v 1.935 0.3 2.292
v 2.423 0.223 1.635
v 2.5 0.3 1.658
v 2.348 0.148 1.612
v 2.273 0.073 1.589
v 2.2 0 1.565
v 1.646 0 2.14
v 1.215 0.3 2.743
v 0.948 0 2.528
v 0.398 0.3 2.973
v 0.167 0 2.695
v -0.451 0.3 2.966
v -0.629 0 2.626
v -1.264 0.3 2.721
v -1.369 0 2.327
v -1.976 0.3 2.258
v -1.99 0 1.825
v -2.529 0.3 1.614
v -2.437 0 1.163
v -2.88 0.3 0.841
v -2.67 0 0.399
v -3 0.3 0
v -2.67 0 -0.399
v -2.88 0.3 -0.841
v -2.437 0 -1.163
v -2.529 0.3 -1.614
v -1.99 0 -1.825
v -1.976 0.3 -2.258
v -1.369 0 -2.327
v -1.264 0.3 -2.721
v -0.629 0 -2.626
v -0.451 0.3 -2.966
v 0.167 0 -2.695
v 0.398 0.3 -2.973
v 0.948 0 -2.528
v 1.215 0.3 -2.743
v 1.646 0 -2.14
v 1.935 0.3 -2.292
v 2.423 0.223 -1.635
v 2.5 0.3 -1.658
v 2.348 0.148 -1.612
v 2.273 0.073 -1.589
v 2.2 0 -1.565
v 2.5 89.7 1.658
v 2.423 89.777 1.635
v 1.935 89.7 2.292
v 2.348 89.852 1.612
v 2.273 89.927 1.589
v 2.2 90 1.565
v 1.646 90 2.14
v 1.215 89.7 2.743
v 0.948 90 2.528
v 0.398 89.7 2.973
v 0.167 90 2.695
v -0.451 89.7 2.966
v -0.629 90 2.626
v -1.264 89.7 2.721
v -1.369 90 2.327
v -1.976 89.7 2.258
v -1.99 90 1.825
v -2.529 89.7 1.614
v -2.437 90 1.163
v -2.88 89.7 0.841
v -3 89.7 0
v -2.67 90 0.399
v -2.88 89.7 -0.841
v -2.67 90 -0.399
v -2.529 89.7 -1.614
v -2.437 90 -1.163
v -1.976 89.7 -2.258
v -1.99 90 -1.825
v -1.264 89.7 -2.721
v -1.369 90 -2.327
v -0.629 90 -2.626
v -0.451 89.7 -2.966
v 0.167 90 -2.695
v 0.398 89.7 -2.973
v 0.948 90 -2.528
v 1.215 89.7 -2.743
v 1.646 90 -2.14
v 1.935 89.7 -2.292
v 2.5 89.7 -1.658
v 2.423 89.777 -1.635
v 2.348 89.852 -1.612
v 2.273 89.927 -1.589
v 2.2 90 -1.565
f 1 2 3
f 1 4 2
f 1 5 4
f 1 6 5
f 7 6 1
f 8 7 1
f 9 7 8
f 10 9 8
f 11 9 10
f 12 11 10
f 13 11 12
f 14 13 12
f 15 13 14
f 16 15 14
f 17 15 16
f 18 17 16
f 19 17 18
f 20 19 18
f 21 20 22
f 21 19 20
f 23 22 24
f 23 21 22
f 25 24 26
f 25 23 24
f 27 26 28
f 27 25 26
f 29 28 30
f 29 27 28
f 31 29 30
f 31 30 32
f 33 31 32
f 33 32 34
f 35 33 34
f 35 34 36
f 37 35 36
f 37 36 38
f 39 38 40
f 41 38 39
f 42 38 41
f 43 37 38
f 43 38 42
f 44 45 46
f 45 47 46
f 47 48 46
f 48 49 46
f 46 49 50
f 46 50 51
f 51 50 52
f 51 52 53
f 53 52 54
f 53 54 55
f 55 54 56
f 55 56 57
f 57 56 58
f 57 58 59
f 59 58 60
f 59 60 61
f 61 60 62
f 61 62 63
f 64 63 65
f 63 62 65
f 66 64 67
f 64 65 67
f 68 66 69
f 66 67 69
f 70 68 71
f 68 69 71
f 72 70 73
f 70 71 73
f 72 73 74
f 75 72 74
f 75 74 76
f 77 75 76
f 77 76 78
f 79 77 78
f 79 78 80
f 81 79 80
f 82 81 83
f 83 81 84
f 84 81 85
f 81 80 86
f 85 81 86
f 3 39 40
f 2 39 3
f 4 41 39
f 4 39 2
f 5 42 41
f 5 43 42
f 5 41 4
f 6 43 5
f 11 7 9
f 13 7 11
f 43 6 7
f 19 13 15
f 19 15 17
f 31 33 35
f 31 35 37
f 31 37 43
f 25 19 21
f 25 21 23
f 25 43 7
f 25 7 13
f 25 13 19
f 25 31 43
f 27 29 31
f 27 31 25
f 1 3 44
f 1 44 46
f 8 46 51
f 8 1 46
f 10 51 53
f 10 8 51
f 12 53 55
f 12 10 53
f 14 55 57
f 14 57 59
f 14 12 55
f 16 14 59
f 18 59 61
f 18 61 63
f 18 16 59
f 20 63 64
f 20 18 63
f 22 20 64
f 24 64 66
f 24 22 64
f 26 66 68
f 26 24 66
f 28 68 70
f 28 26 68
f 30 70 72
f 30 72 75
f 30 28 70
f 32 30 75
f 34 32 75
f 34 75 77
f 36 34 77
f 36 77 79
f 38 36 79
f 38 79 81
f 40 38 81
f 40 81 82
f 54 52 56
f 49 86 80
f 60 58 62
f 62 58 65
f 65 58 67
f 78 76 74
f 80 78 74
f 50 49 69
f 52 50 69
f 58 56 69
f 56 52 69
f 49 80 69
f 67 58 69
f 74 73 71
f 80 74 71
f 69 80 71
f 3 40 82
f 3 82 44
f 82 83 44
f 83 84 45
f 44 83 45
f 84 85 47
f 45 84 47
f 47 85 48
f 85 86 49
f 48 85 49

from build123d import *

# Parameters (mm, degrees)
BOSS_EXTRUDE1_DEPTH = 90
CHAMFER1_SIZE       = 0.3


with BuildPart() as part:
    # Sketch1 → Boss-Extrude1 (new body)
    with BuildSketch(Plane(origin=(0, 0, 0), x_dir=(1, 0, 0), z_dir=(0, 1, 0))):
        with BuildLine():
            Line((2.5, 1.658312395), (2.5, -1.658312395))
            ThreePointArc((2.5, -1.658312395), (-3, 0), (2.5, 1.658312395))
        make_face()
    extrude(amount=BOSS_EXTRUDE1_DEPTH)

    # Chamfer1
    chamfer1_edges = [part.edges().sort_by_distance(p)[0] for p in [
        (2.5, 0, 0),
        (-3, 0, 0),
        (-3, 90, 0),
        (2.5, 90, 0),
    ]]
    chamfer(chamfer1_edges, length=CHAMFER1_SIZE)


solid = part.part
